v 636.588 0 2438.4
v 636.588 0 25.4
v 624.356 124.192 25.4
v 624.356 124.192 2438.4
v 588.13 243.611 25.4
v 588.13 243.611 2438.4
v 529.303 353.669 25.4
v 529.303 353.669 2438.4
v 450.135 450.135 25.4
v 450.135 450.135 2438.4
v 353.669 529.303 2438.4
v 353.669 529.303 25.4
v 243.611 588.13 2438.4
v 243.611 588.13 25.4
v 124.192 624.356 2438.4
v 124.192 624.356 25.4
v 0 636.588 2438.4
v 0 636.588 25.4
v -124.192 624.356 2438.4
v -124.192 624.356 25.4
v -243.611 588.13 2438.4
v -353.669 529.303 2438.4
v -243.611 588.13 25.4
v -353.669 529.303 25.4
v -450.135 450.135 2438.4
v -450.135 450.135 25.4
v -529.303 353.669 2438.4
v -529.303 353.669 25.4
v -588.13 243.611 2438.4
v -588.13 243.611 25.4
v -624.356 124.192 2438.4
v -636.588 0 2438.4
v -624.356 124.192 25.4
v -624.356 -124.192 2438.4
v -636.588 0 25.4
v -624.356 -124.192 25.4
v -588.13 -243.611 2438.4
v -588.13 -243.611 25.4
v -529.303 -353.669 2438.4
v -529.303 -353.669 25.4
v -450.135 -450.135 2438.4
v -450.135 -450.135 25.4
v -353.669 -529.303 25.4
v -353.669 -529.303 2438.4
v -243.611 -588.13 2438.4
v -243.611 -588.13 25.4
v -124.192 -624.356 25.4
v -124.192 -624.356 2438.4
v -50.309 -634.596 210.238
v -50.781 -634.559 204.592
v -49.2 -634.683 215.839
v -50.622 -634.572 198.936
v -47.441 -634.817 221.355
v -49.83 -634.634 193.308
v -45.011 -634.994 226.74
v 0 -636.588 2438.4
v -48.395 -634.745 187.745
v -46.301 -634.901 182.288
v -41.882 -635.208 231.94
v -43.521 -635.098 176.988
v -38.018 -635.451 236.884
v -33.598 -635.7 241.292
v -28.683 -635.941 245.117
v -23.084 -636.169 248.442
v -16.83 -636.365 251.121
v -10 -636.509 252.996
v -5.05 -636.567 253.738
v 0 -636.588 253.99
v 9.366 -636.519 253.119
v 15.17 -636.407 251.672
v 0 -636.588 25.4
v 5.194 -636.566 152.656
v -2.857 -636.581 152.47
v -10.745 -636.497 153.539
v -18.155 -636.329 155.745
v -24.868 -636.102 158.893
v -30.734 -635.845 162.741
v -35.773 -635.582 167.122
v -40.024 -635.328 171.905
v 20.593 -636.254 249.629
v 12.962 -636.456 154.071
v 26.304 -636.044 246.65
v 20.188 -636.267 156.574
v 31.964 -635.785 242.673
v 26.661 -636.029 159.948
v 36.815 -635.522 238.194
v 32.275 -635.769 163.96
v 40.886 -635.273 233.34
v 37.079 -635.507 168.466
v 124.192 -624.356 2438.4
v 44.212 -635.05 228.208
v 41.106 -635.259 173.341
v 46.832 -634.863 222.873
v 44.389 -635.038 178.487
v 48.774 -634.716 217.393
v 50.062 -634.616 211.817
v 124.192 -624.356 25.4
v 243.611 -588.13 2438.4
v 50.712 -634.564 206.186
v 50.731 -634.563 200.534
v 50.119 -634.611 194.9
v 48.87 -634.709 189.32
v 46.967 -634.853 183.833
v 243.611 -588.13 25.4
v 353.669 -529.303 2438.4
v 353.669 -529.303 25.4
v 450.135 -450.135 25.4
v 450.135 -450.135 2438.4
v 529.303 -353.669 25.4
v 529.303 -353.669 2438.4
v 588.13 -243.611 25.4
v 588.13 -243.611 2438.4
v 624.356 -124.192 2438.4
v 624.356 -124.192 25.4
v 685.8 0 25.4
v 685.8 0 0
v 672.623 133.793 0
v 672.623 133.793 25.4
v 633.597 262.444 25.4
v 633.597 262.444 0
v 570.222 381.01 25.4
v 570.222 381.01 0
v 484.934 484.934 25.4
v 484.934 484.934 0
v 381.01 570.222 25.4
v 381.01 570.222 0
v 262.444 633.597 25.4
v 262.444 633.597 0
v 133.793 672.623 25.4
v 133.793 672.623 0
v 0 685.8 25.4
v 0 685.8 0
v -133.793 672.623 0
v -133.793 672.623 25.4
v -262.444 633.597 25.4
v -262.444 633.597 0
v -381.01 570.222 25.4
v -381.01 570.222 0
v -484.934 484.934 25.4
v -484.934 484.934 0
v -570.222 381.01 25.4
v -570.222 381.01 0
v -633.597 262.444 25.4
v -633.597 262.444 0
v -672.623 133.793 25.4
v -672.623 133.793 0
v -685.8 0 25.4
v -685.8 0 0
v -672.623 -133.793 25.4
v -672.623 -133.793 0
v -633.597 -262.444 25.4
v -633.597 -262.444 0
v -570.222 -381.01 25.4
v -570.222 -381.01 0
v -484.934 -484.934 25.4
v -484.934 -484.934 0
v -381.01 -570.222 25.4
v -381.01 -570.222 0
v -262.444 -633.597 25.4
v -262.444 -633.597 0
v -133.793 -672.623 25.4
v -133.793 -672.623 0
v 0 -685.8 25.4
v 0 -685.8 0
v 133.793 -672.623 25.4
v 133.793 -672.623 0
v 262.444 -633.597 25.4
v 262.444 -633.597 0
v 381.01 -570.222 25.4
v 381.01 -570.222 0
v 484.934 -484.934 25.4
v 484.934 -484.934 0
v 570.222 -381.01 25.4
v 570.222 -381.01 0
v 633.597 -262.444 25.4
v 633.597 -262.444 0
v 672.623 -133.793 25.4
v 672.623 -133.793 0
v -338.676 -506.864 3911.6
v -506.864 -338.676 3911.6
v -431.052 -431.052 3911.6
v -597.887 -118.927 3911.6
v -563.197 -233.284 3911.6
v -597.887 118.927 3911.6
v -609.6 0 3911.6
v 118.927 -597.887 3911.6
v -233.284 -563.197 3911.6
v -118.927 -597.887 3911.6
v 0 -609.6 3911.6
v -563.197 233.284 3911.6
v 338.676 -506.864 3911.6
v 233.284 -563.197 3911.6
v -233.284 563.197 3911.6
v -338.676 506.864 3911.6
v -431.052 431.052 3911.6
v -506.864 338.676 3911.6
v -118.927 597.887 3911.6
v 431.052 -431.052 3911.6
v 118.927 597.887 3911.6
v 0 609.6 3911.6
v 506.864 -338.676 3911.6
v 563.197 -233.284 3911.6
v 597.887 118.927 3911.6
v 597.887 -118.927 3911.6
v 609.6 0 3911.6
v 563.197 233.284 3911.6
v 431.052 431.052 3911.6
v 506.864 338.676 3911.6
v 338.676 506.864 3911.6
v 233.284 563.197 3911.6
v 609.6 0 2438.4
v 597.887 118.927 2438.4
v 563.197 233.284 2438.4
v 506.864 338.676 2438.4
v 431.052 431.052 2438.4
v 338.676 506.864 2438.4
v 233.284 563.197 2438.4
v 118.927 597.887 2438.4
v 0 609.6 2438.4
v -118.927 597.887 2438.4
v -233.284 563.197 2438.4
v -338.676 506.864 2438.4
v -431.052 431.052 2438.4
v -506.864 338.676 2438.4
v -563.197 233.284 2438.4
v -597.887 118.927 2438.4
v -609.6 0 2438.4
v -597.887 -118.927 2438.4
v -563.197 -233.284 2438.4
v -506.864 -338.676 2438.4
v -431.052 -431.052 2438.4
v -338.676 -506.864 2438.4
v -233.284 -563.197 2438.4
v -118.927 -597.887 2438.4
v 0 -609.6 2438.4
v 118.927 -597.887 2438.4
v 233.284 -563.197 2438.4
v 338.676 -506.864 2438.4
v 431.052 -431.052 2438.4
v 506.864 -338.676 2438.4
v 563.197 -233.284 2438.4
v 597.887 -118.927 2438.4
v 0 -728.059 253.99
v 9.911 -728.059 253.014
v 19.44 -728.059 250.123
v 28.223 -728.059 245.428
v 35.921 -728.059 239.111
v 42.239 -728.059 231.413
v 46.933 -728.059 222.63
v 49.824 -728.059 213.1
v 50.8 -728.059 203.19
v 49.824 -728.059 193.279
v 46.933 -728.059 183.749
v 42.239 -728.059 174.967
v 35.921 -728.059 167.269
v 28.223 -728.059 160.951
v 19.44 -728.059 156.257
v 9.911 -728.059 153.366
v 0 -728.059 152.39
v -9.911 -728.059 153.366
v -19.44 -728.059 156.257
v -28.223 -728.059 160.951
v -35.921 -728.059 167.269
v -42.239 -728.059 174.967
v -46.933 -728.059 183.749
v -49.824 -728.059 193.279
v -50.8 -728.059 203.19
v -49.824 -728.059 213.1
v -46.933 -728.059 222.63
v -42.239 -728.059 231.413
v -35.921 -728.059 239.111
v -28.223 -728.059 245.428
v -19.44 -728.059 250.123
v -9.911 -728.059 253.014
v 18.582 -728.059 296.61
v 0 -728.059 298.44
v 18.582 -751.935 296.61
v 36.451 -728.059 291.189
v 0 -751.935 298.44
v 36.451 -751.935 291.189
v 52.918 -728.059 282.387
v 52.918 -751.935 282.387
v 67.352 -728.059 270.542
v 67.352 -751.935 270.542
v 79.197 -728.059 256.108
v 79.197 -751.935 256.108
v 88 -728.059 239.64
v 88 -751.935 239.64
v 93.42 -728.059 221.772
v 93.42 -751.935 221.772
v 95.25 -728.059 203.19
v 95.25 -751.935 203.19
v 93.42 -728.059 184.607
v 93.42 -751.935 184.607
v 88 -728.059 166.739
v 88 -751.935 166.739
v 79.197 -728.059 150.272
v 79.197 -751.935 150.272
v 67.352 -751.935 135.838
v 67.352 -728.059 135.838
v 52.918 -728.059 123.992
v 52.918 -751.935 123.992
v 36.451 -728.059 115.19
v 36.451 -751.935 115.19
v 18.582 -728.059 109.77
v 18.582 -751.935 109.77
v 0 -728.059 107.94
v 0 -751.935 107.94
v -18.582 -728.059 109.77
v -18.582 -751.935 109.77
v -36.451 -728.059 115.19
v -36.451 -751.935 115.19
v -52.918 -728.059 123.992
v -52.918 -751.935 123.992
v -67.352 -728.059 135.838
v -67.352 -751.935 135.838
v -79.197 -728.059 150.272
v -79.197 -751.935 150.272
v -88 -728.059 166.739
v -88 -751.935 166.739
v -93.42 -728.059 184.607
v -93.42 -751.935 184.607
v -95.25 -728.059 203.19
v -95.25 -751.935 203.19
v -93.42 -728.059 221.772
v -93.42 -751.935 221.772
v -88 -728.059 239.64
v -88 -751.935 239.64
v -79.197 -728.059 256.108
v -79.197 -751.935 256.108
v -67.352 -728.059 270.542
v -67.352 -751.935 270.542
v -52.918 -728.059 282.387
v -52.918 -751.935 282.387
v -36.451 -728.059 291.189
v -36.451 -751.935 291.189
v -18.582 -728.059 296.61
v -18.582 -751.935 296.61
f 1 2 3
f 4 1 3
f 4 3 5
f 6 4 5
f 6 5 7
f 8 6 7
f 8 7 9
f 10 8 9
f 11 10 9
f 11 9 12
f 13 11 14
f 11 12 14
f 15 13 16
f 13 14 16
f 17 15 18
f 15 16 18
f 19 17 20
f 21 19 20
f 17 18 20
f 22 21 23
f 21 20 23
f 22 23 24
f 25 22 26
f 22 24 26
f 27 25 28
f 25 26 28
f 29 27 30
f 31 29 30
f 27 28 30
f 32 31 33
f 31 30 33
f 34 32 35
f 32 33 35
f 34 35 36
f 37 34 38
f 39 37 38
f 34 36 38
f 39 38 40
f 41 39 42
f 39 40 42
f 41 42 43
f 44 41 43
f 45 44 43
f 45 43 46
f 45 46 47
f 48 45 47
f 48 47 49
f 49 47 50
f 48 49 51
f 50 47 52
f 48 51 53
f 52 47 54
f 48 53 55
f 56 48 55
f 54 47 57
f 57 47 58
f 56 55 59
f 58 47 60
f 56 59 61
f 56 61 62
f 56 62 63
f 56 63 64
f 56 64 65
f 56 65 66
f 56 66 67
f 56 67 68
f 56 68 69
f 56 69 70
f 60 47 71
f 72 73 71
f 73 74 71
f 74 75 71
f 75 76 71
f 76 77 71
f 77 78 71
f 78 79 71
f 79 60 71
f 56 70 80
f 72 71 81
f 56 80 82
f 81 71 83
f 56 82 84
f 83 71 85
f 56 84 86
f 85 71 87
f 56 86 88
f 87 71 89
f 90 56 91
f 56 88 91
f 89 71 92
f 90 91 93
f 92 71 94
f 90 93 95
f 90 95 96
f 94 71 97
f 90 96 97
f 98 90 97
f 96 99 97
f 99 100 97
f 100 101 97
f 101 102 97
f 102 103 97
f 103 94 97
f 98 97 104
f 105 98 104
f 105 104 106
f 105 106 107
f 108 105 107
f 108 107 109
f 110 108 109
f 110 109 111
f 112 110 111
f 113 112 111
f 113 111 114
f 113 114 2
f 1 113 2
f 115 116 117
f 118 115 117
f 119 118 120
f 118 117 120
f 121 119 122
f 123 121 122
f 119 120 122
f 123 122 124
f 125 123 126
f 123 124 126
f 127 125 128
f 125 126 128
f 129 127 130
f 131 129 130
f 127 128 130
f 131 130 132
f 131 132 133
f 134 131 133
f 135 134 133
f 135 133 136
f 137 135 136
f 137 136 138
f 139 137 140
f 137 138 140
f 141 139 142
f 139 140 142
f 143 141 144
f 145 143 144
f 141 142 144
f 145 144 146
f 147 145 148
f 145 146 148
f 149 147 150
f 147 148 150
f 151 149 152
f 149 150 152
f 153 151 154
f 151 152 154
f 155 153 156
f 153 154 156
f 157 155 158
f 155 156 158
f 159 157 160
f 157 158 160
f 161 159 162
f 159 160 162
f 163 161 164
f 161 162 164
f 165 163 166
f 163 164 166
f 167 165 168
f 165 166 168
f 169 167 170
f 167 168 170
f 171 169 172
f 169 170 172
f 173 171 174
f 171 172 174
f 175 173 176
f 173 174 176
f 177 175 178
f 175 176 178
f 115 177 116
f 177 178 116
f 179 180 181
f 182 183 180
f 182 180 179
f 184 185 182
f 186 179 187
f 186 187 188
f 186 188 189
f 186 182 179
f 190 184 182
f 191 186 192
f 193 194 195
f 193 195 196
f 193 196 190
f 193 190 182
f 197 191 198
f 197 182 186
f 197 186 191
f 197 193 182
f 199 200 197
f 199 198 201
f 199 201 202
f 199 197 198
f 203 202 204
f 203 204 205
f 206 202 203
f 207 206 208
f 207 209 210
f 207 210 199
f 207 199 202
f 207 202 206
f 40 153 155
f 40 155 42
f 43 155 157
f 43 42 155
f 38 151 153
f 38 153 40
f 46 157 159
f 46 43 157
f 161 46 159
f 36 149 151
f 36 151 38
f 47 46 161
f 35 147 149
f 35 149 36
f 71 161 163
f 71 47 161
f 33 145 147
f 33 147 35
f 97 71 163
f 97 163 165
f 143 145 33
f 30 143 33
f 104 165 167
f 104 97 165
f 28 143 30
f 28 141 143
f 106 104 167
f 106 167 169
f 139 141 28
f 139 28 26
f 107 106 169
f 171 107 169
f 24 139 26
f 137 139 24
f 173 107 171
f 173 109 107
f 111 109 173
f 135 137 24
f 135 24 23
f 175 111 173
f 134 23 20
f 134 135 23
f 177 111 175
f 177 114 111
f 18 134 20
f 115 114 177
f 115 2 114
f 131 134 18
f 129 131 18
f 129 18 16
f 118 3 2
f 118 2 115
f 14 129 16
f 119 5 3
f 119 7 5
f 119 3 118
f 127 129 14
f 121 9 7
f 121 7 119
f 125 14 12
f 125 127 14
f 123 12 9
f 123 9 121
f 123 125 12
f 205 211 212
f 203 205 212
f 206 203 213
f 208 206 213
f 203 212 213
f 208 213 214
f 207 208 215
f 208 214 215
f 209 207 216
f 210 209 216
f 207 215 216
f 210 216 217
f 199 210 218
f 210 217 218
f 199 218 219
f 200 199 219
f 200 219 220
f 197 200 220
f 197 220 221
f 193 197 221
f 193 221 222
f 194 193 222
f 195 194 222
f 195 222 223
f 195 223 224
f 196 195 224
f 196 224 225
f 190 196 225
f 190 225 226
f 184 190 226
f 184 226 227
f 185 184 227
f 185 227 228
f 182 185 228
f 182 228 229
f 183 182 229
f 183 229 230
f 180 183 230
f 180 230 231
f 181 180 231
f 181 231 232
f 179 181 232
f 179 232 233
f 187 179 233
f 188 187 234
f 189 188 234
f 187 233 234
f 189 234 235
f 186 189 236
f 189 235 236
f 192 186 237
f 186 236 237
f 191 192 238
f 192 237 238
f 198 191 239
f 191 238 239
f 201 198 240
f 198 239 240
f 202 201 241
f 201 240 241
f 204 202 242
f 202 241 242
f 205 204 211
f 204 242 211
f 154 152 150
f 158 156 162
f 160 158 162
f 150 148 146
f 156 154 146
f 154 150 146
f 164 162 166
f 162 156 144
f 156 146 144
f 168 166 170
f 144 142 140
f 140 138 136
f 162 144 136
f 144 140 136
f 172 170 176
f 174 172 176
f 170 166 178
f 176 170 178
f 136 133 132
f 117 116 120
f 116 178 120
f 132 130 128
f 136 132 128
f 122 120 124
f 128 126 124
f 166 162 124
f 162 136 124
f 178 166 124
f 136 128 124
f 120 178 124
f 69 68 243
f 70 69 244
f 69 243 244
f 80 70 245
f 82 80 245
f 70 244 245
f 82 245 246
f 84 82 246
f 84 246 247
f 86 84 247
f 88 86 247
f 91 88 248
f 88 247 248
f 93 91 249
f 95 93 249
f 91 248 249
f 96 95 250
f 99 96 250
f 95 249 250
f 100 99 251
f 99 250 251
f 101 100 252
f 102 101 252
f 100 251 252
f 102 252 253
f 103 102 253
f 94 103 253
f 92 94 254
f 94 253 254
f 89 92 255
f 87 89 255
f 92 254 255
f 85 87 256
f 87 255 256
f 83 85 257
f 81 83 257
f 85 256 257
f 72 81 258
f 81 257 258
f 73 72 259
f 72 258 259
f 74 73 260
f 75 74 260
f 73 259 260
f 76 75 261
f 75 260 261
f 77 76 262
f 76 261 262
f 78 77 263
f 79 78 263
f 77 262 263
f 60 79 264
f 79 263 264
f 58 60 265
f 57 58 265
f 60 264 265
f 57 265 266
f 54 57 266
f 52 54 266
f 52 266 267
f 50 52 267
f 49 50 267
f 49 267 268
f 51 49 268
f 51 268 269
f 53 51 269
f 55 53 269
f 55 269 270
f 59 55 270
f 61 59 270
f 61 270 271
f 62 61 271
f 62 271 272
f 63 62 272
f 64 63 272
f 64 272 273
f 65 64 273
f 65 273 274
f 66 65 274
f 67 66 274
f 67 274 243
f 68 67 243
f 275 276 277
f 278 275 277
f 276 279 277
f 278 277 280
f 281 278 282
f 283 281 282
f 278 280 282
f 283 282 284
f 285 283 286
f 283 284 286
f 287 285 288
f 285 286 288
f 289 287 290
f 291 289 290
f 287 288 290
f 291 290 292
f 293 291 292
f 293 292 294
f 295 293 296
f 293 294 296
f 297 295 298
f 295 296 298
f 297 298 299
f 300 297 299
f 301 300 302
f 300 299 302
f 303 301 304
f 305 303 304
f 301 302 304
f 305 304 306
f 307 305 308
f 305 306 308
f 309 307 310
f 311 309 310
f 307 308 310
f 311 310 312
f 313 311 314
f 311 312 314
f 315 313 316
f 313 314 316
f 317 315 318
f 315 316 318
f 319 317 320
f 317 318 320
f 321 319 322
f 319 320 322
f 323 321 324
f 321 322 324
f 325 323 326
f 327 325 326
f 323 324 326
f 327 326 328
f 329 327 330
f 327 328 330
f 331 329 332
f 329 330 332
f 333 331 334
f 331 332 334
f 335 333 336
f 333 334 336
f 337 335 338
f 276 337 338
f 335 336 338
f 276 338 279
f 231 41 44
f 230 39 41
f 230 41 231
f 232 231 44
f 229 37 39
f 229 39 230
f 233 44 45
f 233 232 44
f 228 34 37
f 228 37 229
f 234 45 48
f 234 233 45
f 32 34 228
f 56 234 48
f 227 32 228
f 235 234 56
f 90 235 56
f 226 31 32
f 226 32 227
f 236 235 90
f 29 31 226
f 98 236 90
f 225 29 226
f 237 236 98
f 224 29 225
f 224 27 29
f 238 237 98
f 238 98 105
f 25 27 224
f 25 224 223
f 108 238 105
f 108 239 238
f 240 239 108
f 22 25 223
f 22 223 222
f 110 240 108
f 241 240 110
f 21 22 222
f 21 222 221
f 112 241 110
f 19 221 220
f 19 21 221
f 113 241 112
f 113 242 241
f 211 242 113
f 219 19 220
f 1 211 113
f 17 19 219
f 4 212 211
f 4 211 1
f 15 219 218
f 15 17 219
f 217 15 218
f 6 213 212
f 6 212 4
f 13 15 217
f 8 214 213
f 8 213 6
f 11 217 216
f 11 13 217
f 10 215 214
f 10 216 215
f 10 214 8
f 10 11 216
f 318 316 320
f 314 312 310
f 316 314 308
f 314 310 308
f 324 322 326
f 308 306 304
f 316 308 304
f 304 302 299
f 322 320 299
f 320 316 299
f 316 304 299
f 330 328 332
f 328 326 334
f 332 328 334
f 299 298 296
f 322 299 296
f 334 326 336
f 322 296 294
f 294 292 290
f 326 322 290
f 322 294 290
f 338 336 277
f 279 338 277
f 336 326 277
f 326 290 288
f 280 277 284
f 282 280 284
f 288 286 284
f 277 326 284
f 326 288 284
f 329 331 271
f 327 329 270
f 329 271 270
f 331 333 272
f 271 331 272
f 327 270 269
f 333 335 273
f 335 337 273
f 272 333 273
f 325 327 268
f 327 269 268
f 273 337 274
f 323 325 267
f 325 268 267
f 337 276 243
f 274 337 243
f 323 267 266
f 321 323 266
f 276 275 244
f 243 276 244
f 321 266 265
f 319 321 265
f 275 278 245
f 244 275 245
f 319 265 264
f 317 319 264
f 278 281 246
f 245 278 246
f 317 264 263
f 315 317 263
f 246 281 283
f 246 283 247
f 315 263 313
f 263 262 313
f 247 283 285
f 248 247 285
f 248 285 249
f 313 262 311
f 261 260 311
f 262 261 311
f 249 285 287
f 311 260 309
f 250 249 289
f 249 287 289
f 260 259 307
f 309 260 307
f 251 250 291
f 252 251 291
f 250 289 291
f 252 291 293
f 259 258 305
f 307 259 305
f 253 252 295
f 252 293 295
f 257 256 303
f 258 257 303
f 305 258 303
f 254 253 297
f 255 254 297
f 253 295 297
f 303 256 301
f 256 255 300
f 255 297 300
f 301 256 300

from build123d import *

# Parameters (mm, degrees)
F0_R     = 609.6
F1_DEPTH = 3911.6
F0_R_2   = 636.5875
F2_DEPTH = 2438.4
F0_R_3   = 685.8
F3_DEPTH = 25.4


with BuildPart() as f1:
    # F0 (on Top) → F1 (new body)
    with BuildSketch(Plane.XY):
        Circle(F0_R)
    extrude(amount=F1_DEPTH)

    # F0 (on Top) → F2 (join)
    with BuildSketch(Plane.XY):
        Circle(F0_R_2)
        Circle(F0_R, mode=Mode.SUBTRACT)
    extrude(amount=F2_DEPTH)

    # F0 (on Top) → F3 (join)
    with BuildSketch(Plane.XY):
        Circle(F0_R_3)
        Circle(F0_R_2, mode=Mode.SUBTRACT)
    extrude(amount=F3_DEPTH)

    # F4 (on Right) → F5 (revolve)
    with BuildSketch(Plane.YZ):
        Polygon((-751.934826, 298.439804), (-751.934826, 203.189804), (-625.43714, 203.189804), (-625.43714, 253.989804), (-728.058826, 253.989804), (-728.058826, 298.439804), align=None)
    revolve(axis=Axis((0, -584.725052, 203.189804), (0, 1, 0)))


solid = f1.part
